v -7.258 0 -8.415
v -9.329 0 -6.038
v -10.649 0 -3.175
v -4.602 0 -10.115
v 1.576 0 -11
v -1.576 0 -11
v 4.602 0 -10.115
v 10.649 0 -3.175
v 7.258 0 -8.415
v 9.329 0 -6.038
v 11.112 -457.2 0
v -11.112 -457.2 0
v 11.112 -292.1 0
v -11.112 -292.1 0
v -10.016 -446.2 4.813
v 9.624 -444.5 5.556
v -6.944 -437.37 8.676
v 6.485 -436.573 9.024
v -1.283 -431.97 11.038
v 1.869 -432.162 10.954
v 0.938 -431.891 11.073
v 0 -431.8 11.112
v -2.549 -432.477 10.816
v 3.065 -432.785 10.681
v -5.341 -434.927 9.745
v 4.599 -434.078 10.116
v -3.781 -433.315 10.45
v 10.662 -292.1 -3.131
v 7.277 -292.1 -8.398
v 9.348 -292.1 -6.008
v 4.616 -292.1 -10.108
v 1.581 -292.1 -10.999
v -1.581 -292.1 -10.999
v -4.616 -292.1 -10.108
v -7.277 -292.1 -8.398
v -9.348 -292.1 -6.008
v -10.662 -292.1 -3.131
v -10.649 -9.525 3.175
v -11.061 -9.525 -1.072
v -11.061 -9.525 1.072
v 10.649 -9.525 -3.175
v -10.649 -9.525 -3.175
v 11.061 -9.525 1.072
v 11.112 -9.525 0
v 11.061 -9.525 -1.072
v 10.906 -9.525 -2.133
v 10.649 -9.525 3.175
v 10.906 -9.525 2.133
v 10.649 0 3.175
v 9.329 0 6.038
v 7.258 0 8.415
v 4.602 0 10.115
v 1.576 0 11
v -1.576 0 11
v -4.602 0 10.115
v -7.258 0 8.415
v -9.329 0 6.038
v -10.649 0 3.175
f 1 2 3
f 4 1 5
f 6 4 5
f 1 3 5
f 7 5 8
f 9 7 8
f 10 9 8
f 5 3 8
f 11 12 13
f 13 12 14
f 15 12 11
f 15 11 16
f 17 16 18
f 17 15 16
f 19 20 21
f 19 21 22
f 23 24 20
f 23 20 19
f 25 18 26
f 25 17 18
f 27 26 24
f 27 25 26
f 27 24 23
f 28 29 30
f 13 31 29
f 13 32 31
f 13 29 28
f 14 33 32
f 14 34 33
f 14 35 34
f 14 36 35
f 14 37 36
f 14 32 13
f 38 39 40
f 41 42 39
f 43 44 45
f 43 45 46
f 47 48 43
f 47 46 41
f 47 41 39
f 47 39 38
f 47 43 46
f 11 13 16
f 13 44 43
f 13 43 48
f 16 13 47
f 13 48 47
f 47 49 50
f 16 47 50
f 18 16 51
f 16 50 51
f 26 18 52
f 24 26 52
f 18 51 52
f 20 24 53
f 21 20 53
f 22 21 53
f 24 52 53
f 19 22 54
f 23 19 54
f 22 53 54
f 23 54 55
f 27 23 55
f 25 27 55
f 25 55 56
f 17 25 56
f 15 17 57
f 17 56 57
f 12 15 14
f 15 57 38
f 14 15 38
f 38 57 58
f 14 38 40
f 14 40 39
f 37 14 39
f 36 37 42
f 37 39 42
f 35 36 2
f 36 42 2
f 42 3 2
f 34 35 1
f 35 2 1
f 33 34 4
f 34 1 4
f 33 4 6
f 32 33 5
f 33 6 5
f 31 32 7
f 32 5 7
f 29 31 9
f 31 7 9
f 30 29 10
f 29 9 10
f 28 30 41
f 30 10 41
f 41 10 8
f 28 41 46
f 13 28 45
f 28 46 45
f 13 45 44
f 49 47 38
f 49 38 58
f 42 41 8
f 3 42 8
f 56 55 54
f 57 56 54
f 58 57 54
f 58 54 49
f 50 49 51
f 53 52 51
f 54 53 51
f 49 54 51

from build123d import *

# Parameters (mm, degrees)
F0_R     = 11.1125
F1_DEPTH = 457.2
F2_W     = 165.1
F2_H     = 11.1125
F2_W_2   = 19.05
F2_H_2   = 6.35
F3_DEPTH = 12.7


with BuildPart() as f1:
    # F0 (on Front) → F1 (new body)
    with BuildSketch(Plane.XZ):
        Circle(F0_R)
    extrude(amount=F1_DEPTH)

    # F2 (on Right) → F3 (cut, symmetric)
    with BuildSketch(Plane.YZ):
        with Locations((-374.65, -5.55625)):
            Rectangle(F2_W, F2_H)
        Polygon((-457.2, 11.1125), (-457.2, 0), (-431.8, 11.1125), align=None)
        Rectangle(F2_W_2, F2_H_2)
    extrude(amount=F3_DEPTH, both=True, mode=Mode.SUBTRACT)


solid = f1.part
